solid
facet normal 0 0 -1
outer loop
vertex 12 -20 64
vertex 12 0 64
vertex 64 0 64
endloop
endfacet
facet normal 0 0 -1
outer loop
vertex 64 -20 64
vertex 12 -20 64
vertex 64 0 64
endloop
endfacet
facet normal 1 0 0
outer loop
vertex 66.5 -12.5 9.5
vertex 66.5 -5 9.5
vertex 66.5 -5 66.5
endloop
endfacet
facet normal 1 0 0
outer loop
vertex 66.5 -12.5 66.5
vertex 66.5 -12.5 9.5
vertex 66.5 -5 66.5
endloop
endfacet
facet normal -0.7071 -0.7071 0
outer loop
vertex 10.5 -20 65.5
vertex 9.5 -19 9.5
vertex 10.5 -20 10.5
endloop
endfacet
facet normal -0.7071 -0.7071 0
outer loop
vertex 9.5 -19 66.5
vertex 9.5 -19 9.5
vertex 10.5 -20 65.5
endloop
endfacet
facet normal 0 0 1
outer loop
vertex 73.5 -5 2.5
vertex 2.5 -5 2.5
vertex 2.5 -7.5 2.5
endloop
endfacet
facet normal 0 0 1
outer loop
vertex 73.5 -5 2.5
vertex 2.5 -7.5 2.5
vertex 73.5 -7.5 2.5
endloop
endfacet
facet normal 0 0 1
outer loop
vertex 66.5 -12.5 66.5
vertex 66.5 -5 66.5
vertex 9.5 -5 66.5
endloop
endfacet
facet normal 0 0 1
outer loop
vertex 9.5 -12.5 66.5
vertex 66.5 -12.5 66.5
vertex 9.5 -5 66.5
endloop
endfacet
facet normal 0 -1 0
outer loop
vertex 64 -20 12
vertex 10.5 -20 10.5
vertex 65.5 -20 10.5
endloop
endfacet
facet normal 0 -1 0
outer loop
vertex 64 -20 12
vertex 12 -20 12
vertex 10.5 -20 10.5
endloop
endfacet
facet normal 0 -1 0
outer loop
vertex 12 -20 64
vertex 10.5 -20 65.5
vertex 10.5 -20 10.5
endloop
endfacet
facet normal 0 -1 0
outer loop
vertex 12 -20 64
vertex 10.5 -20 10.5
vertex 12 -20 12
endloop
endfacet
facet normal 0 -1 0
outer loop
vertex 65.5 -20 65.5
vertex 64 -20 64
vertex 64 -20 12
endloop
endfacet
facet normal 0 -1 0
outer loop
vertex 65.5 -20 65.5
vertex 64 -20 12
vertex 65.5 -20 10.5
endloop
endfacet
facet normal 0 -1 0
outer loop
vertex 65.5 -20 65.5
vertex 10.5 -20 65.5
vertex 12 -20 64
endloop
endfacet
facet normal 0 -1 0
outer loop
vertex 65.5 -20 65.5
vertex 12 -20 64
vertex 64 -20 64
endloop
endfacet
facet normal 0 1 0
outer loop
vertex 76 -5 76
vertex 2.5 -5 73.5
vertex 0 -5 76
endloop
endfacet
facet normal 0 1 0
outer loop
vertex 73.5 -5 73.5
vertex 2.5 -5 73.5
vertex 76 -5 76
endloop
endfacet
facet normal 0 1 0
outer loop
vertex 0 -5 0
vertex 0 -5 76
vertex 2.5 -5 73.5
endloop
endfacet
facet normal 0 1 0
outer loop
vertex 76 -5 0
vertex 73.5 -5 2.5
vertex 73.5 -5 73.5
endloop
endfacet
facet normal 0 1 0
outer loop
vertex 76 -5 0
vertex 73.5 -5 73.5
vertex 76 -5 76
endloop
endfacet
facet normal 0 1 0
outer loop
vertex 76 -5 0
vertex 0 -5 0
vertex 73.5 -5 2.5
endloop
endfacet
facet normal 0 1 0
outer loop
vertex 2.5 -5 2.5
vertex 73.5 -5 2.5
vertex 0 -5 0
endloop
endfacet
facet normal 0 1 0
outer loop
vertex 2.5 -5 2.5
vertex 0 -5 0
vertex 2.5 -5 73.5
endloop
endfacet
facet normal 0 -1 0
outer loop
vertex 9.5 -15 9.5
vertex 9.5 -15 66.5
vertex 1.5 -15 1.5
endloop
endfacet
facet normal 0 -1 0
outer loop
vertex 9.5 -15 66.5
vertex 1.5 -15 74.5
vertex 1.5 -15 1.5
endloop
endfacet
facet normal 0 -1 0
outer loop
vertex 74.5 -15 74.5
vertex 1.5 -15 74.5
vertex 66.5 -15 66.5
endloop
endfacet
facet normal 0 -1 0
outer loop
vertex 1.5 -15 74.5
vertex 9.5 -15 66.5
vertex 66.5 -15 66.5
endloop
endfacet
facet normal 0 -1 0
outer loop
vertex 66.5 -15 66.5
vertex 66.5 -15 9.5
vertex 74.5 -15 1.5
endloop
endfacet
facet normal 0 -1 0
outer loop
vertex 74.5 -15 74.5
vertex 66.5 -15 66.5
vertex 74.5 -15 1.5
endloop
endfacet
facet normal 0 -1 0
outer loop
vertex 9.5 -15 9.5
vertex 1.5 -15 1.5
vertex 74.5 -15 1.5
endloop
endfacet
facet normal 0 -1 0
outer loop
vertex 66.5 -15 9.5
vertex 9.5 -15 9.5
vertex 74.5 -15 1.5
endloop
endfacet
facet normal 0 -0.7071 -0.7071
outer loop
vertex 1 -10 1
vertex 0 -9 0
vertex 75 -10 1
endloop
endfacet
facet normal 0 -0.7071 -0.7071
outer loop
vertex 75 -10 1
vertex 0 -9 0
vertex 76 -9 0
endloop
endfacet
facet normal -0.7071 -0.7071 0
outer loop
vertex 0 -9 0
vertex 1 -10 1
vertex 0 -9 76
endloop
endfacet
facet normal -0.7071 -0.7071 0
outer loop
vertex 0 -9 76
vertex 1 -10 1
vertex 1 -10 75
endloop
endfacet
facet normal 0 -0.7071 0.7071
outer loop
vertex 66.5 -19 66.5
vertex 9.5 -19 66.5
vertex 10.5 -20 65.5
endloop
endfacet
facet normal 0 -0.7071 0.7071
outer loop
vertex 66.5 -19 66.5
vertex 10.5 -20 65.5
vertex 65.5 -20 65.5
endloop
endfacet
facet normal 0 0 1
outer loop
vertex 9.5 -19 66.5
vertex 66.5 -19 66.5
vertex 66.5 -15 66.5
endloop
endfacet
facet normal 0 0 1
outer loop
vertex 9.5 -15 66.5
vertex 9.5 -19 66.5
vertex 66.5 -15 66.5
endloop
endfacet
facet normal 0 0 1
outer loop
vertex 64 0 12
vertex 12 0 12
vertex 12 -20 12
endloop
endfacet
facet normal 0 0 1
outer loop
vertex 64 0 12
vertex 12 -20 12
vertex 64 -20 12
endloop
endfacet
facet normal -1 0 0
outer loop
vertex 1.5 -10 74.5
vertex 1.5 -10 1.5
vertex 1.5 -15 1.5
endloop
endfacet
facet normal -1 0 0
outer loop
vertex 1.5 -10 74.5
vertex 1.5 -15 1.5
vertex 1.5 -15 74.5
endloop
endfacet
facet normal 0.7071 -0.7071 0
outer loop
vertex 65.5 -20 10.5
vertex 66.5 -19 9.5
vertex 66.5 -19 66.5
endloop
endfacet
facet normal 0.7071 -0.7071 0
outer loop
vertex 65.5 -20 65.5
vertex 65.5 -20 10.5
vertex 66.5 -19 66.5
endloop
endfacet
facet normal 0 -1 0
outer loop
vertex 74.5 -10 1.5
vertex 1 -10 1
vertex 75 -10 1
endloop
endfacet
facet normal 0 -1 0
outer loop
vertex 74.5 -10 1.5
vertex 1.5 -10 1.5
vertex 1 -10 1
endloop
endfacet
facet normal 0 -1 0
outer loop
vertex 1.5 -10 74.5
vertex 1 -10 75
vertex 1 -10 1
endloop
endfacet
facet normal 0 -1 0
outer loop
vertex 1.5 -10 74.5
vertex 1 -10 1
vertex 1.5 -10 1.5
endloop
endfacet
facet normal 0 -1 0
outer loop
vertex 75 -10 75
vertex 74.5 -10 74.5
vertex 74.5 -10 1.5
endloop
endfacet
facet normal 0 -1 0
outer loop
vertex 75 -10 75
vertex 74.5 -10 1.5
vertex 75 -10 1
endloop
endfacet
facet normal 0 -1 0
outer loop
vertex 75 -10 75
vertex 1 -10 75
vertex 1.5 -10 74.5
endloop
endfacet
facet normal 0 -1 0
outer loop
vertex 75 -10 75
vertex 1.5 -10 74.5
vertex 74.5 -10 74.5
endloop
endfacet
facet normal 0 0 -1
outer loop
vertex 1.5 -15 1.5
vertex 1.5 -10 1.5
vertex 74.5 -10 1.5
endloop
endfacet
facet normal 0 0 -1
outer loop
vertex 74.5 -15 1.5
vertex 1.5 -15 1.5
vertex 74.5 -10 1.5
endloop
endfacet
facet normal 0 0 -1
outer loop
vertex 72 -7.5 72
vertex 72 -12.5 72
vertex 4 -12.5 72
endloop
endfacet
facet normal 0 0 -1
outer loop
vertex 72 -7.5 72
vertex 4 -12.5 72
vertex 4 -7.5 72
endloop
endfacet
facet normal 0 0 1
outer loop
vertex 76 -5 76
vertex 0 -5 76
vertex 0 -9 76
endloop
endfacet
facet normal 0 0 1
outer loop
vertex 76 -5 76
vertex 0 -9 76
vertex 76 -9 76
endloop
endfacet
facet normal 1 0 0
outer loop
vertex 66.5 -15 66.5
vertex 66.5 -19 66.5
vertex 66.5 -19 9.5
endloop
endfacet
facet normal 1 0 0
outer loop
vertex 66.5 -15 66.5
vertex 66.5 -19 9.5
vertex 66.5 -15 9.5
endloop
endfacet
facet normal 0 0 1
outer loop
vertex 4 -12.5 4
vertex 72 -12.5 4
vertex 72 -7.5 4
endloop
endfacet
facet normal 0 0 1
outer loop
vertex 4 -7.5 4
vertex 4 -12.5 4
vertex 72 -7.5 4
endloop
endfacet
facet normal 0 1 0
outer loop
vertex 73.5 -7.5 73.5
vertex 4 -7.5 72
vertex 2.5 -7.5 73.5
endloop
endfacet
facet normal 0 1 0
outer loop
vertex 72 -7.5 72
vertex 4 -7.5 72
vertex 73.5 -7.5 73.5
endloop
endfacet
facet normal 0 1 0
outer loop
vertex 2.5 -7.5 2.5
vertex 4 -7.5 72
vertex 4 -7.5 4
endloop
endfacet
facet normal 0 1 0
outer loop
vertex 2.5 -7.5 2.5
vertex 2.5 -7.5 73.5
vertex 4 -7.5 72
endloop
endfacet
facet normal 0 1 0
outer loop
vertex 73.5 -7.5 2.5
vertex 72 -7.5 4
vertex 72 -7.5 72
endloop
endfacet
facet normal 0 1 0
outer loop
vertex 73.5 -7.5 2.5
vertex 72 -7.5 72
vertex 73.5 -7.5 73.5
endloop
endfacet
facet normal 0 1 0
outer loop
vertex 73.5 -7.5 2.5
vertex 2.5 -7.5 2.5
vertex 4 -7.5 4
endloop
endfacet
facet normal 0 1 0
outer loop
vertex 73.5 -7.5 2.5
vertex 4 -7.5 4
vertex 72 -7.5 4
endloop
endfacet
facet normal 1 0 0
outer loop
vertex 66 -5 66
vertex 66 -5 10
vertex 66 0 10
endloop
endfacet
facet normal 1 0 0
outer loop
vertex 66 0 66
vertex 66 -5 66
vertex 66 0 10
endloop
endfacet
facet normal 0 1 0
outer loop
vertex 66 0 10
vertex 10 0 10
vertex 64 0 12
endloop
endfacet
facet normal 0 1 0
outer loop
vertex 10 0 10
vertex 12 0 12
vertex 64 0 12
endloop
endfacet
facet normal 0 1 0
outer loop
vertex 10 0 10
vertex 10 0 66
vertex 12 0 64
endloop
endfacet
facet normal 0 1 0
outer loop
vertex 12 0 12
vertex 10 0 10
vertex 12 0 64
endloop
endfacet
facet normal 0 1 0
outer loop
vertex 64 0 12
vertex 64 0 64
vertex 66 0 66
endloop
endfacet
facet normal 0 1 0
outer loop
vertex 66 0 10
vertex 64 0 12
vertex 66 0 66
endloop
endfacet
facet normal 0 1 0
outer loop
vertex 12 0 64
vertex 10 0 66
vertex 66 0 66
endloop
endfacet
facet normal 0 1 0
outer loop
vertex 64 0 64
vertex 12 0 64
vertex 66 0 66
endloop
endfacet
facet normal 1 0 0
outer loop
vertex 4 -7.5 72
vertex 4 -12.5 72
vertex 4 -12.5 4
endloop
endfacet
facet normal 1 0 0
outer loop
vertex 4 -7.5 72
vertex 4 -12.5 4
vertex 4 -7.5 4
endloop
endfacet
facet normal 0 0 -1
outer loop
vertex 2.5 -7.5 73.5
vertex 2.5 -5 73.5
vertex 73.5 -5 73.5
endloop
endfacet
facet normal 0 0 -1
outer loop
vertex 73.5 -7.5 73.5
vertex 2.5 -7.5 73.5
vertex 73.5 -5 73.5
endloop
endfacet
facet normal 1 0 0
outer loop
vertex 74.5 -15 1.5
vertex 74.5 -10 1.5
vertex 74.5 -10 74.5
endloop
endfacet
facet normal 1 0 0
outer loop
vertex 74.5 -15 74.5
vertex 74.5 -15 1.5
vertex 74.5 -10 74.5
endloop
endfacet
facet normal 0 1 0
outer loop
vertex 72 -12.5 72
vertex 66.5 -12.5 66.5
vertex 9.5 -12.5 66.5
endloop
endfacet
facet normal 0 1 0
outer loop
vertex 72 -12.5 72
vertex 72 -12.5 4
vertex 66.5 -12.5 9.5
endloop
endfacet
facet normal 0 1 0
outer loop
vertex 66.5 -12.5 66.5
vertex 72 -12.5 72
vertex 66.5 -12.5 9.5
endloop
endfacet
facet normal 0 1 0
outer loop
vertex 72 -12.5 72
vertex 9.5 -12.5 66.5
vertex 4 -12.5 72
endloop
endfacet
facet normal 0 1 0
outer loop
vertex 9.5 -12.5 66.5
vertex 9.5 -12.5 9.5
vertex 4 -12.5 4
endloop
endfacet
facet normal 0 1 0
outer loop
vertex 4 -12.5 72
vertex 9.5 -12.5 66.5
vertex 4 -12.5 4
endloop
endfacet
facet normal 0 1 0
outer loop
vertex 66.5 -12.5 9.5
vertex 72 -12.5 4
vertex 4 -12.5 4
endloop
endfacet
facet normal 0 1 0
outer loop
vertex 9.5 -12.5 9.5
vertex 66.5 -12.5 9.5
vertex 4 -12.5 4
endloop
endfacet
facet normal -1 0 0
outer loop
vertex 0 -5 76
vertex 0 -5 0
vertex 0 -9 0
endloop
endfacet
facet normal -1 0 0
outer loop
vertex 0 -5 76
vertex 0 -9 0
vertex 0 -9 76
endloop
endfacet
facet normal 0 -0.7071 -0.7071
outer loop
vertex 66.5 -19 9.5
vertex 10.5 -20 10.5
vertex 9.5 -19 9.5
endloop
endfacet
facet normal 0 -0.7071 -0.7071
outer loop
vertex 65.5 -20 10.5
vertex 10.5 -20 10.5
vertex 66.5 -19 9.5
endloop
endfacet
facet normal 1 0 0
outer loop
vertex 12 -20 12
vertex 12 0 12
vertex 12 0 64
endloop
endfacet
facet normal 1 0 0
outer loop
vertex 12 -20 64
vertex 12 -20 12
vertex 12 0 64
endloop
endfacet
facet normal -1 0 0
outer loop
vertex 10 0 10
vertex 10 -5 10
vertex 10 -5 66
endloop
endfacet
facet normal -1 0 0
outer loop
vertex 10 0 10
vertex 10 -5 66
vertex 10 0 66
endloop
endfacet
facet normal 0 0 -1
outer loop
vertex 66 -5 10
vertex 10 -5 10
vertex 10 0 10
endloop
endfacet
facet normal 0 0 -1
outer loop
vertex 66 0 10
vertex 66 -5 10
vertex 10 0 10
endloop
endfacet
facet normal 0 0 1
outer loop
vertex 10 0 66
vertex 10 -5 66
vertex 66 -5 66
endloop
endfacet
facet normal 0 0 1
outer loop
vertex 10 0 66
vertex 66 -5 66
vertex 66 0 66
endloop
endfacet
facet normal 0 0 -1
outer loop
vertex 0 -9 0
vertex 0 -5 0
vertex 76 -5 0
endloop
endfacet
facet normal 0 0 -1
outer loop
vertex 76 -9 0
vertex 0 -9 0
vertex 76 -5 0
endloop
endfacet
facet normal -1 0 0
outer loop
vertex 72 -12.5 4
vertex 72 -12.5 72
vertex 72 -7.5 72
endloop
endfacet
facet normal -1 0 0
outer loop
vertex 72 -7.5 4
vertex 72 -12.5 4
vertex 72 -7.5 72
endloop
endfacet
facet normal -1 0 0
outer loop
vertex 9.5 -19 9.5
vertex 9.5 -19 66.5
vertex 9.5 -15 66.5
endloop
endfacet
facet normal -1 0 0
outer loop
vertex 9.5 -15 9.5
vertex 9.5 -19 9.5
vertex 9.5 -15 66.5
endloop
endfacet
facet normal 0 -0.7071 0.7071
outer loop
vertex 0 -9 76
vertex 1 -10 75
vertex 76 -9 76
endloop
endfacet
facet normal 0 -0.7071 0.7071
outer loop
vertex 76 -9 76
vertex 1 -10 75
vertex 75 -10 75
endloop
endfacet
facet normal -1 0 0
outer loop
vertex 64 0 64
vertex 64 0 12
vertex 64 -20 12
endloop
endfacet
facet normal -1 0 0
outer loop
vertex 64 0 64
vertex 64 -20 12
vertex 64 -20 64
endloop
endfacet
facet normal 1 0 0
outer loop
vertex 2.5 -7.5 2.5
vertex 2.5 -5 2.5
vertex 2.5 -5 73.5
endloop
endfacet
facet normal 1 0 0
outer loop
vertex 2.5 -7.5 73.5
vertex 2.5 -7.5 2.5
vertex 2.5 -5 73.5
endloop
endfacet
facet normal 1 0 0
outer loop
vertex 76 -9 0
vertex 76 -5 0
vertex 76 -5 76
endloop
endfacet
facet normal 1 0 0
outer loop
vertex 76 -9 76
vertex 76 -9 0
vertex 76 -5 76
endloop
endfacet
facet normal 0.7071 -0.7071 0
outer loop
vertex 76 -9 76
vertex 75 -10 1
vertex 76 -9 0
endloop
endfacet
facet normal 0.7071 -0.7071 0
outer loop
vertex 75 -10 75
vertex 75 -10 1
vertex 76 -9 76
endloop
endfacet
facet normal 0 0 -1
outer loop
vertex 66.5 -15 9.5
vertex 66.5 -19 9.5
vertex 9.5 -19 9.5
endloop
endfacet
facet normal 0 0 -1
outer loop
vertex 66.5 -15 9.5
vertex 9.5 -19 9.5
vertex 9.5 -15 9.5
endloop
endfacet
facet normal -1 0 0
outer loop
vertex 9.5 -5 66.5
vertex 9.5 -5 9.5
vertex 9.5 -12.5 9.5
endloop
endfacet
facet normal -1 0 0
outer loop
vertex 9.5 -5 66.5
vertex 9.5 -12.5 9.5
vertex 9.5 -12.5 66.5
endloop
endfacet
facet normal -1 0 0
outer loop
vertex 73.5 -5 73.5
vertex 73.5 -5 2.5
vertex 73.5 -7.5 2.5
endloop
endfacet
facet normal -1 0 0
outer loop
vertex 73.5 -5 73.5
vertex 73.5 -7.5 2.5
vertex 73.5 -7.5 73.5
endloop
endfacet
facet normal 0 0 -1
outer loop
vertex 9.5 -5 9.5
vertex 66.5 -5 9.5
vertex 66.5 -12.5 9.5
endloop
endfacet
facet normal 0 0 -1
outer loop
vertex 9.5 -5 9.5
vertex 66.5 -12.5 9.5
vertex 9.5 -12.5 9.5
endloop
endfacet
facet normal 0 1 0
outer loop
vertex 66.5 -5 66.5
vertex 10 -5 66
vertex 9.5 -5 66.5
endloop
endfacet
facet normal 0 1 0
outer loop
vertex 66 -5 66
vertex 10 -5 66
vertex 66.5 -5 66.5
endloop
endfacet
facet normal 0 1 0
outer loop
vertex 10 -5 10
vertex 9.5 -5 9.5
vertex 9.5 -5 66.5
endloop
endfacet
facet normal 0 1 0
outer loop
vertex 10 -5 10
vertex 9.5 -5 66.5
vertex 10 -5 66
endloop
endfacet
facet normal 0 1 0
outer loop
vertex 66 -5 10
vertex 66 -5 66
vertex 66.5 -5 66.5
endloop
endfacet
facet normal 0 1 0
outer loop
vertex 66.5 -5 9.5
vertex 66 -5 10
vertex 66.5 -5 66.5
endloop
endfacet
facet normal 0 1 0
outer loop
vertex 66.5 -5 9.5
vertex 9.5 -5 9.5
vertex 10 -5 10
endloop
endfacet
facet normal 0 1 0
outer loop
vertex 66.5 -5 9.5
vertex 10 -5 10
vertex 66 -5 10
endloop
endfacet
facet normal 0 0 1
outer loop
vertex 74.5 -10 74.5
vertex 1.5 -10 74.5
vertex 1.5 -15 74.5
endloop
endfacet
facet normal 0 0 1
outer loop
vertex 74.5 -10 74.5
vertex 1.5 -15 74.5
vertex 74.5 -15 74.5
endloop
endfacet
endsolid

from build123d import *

# Parameters (mm, degrees)
F0_W          = 73
F0_H          = 73
F0_W_2        = 56
F0_H_2        = 56
F0_W_3        = 52
F0_H_3        = 52
F1_DEPTH      = 20
F0_W_4        = 76
F0_H_4        = 76
F2_DEPTH      = 3
F3_DEPTH      = 10
F4_W          = 10
F4_H          = 5
F5_DEPTH      = 80
F6_W          = 5
F6_H          = 10
F7_DEPTH      = 80
F8_W          = 8
F8_H          = 5
F9_DEPTH      = 80
F10_W         = 5
F10_H         = 8
F11_DEPTH     = 80
F12_SIZE      = 1
F13_T         = 2.5
F13_T3_DEPTH  = 62
F13_T5_DEPTH  = 62
F13_T7_DEPTH  = 78
F13_T9_DEPTH  = 78
F13_T11_DEPTH = 25


# Not quite as in the source:
# - a shell that OpenCascade refuses in one call is made with other operations: the cavity is built on its own and cut out


with BuildPart() as f1:
    # F0 (on Front) → F1 (new body)
    with BuildSketch(Plane.XZ):
        with Locations((38, 38)):
            Rectangle(F0_W, F0_H)
        with Locations((38, 38)):
            Rectangle(F0_W_2, F0_H_2, mode=Mode.SUBTRACT)
        with Locations((38, 38)):
            Rectangle(F0_W_2, F0_H_2)
        with Locations((38, 38)):
            Rectangle(F0_W_3, F0_H_3, mode=Mode.SUBTRACT)
    extrude(amount=F1_DEPTH)

    # F0 (on Front) → F2 (join)
    with BuildSketch(Plane.XZ):
        with Locations((38, 38)):
            Rectangle(F0_W_4, F0_H_4)
        with Locations((38, 38)):
            Rectangle(F0_W, F0_H, mode=Mode.SUBTRACT)
    extrude(amount=F2_DEPTH)

    # F0 (on Front) → F3 (join)
    with BuildSketch(Plane.XZ):
        with Locations((38, 38)):
            Rectangle(F0_W_4, F0_H_4)
        with Locations((38, 38)):
            Rectangle(F0_W, F0_H, mode=Mode.SUBTRACT)
    extrude(amount=F3_DEPTH)

    # F4 (on Top) → F5 (cut)
    with BuildSketch(Plane.XY):
        with Locations((5, -2.5)):
            Rectangle(F4_W, F4_H)
        with Locations((71, -2.5)):
            Rectangle(F4_W, F4_H)
    extrude(amount=F5_DEPTH, mode=Mode.SUBTRACT)

    # F6 (on Right) → F7 (cut)
    with BuildSketch(Plane.YZ):
        with Locations((-2.5, 5)):
            Rectangle(F6_W, F6_H)
        with Locations((-2.5, 71)):
            Rectangle(F6_W, F6_H)
    extrude(amount=F7_DEPTH, mode=Mode.SUBTRACT)

    # F8 (on Top) → F9 (cut)
    with BuildSketch(Plane.XY):
        with Locations((5.5, -17.5)):
            Rectangle(F8_W, F8_H)
        with Locations((70.5, -17.5)):
            Rectangle(F8_W, F8_H)
    extrude(amount=F9_DEPTH, mode=Mode.SUBTRACT)

    # F10 (on Right) → F11 (cut)
    with BuildSketch(Plane.YZ):
        with Locations((-17.5, 5.5)):
            Rectangle(F10_W, F10_H)
        with Locations((-17.5, 70.5)):
            Rectangle(F10_W, F10_H)
    extrude(amount=F11_DEPTH, mode=Mode.SUBTRACT)

    # F12
    f12_edges = [f1.edges().sort_by_distance(p)[0] for p in [
        (38, -10, 0),
        (0, -10, 38),
        (76, -10, 38),
        (38, -10, 76),
        (66.5, -20, 38),
        (38, -20, 66.5),
        (38, -20, 9.5),
        (9.5, -20, 38),
    ]]
    chamfer(f12_edges, length=F12_SIZE)

    # F13: shell of thickness 2.5, made by hand


with BuildPart() as f13_core1:
    # F13_t2: copy of F1
    add(f1.part)

    # the walls: a layer under each face that stays
    f13_faces = [f13_core1.faces().sort_by_distance(p)[0] for p in [
        (9.5, -17, 38),
        (38, -17, 66.5),
        (10, -19.5, 38),
        (69.2857142857, -15, 69.2857142857),
        (38, -17, 9.5),
        (38, -19.5, 66),
        (66.5, -17, 38),
        (38, -19.5, 10),
        (56.90625, -20, 11.1790123457),
        (1.5, -12.5, 38),
        (38, -12.5, 1.5),
        (74.5, -12.5, 38),
        (38, -12.5, 74.5),
        (66, -19.5, 38),
        (64, -10, 38),
        (38, -10, 64),
        (38, -10, 12),
        (12, -10, 38),
        (40.890625, -10, 1.304526749),
        (11.8666666667, 0, 11.8666666667),
        (38, -9.5, 0.5),
        (0.5, -9.5, 38),
        (75.5, -9.5, 38),
        (38, -9.5, 75.5),
        (66, -2.5, 38),
        (38, -2.5, 10),
        (10, -2.5, 38),
        (38, -2.5, 66),
        (38, -7, 0),
        (0, -7, 38),
        (76, -7, 38),
        (38, -7, 76),
    ]]
    thicken(f13_faces, amount=-F13_T, mode=Mode.SUBTRACT)

    # F13_s4 → F13_t3 (cut)
    with BuildSketch(Plane.XY.offset(7)):
        Polygon((9.475, -15.025), (12, -15), (12, -12.5), (9.5, -12.5), align=None)
        Polygon((66.525, -15.025), (66.5, -12.5), (64, -12.5), (64, -15), align=None)
    extrude(amount=F13_T3_DEPTH, mode=Mode.SUBTRACT)

    # F13_s6 → F13_t5 (cut)
    with BuildSketch(Plane.YZ.offset(7)):
        Polygon((-15.025, 66.525), (-15, 64), (-12.5, 64), (-12.5, 66.5), align=None)
        Polygon((-15.025, 9.475), (-12.5, 9.5), (-12.5, 12), (-15, 12), align=None)
    extrude(amount=F13_T5_DEPTH, mode=Mode.SUBTRACT)

    # F13_s8 → F13_t7 (cut)
    with BuildSketch(Plane.XY.offset(-1)):
        Polygon((1.475, -10.025), (4, -10), (4, -7.5), (1.5, -7.5), align=None)
        Polygon((74.525, -10.025), (72, -10), (72, -7.5), (74.5, -7.5), align=None)
    extrude(amount=F13_T7_DEPTH, mode=Mode.SUBTRACT)

    # F13_s10 → F13_t9 (cut)
    with BuildSketch(Plane.YZ.offset(-1)):
        Polygon((-10.025, 1.475), (-10, 4), (-7.5, 4), (-7.5, 1.5), align=None)
        Polygon((-10.025, 74.525), (-10, 72), (-7.5, 72), (-7.5, 74.5), align=None)
    extrude(amount=F13_T9_DEPTH, mode=Mode.SUBTRACT)

    # F13_s12 → F13_t11 (cut)
    with BuildSketch(Plane.XZ.offset(-2.5)):
        Polygon((63.975, 63.975), (66.5, 64), (66.5, 66.5), (64, 66.5), align=None)
        Polygon((63.975, 12.025), (66.5, 12), (66.5, 9.5), (64, 9.5), align=None)
        Polygon((12.025, 63.975), (12, 66.5), (9.5, 66.5), (9.5, 64), align=None)
        Polygon((12.025, 12.025), (12, 9.5), (9.5, 9.5), (9.5, 12), align=None)
    extrude(amount=F13_T11_DEPTH, mode=Mode.SUBTRACT)


with BuildPart() as f1_1:
    add(f1.part)

    # what is left inside the walls is the cavity
    f13_cavity = [f13_core1.part.solids().sort_by_distance(p)[0] for p in [
        (65.611111, -5.025, 6.9375),
    ]]
    add(f13_cavity, mode=Mode.SUBTRACT)


solid = f1_1.part
